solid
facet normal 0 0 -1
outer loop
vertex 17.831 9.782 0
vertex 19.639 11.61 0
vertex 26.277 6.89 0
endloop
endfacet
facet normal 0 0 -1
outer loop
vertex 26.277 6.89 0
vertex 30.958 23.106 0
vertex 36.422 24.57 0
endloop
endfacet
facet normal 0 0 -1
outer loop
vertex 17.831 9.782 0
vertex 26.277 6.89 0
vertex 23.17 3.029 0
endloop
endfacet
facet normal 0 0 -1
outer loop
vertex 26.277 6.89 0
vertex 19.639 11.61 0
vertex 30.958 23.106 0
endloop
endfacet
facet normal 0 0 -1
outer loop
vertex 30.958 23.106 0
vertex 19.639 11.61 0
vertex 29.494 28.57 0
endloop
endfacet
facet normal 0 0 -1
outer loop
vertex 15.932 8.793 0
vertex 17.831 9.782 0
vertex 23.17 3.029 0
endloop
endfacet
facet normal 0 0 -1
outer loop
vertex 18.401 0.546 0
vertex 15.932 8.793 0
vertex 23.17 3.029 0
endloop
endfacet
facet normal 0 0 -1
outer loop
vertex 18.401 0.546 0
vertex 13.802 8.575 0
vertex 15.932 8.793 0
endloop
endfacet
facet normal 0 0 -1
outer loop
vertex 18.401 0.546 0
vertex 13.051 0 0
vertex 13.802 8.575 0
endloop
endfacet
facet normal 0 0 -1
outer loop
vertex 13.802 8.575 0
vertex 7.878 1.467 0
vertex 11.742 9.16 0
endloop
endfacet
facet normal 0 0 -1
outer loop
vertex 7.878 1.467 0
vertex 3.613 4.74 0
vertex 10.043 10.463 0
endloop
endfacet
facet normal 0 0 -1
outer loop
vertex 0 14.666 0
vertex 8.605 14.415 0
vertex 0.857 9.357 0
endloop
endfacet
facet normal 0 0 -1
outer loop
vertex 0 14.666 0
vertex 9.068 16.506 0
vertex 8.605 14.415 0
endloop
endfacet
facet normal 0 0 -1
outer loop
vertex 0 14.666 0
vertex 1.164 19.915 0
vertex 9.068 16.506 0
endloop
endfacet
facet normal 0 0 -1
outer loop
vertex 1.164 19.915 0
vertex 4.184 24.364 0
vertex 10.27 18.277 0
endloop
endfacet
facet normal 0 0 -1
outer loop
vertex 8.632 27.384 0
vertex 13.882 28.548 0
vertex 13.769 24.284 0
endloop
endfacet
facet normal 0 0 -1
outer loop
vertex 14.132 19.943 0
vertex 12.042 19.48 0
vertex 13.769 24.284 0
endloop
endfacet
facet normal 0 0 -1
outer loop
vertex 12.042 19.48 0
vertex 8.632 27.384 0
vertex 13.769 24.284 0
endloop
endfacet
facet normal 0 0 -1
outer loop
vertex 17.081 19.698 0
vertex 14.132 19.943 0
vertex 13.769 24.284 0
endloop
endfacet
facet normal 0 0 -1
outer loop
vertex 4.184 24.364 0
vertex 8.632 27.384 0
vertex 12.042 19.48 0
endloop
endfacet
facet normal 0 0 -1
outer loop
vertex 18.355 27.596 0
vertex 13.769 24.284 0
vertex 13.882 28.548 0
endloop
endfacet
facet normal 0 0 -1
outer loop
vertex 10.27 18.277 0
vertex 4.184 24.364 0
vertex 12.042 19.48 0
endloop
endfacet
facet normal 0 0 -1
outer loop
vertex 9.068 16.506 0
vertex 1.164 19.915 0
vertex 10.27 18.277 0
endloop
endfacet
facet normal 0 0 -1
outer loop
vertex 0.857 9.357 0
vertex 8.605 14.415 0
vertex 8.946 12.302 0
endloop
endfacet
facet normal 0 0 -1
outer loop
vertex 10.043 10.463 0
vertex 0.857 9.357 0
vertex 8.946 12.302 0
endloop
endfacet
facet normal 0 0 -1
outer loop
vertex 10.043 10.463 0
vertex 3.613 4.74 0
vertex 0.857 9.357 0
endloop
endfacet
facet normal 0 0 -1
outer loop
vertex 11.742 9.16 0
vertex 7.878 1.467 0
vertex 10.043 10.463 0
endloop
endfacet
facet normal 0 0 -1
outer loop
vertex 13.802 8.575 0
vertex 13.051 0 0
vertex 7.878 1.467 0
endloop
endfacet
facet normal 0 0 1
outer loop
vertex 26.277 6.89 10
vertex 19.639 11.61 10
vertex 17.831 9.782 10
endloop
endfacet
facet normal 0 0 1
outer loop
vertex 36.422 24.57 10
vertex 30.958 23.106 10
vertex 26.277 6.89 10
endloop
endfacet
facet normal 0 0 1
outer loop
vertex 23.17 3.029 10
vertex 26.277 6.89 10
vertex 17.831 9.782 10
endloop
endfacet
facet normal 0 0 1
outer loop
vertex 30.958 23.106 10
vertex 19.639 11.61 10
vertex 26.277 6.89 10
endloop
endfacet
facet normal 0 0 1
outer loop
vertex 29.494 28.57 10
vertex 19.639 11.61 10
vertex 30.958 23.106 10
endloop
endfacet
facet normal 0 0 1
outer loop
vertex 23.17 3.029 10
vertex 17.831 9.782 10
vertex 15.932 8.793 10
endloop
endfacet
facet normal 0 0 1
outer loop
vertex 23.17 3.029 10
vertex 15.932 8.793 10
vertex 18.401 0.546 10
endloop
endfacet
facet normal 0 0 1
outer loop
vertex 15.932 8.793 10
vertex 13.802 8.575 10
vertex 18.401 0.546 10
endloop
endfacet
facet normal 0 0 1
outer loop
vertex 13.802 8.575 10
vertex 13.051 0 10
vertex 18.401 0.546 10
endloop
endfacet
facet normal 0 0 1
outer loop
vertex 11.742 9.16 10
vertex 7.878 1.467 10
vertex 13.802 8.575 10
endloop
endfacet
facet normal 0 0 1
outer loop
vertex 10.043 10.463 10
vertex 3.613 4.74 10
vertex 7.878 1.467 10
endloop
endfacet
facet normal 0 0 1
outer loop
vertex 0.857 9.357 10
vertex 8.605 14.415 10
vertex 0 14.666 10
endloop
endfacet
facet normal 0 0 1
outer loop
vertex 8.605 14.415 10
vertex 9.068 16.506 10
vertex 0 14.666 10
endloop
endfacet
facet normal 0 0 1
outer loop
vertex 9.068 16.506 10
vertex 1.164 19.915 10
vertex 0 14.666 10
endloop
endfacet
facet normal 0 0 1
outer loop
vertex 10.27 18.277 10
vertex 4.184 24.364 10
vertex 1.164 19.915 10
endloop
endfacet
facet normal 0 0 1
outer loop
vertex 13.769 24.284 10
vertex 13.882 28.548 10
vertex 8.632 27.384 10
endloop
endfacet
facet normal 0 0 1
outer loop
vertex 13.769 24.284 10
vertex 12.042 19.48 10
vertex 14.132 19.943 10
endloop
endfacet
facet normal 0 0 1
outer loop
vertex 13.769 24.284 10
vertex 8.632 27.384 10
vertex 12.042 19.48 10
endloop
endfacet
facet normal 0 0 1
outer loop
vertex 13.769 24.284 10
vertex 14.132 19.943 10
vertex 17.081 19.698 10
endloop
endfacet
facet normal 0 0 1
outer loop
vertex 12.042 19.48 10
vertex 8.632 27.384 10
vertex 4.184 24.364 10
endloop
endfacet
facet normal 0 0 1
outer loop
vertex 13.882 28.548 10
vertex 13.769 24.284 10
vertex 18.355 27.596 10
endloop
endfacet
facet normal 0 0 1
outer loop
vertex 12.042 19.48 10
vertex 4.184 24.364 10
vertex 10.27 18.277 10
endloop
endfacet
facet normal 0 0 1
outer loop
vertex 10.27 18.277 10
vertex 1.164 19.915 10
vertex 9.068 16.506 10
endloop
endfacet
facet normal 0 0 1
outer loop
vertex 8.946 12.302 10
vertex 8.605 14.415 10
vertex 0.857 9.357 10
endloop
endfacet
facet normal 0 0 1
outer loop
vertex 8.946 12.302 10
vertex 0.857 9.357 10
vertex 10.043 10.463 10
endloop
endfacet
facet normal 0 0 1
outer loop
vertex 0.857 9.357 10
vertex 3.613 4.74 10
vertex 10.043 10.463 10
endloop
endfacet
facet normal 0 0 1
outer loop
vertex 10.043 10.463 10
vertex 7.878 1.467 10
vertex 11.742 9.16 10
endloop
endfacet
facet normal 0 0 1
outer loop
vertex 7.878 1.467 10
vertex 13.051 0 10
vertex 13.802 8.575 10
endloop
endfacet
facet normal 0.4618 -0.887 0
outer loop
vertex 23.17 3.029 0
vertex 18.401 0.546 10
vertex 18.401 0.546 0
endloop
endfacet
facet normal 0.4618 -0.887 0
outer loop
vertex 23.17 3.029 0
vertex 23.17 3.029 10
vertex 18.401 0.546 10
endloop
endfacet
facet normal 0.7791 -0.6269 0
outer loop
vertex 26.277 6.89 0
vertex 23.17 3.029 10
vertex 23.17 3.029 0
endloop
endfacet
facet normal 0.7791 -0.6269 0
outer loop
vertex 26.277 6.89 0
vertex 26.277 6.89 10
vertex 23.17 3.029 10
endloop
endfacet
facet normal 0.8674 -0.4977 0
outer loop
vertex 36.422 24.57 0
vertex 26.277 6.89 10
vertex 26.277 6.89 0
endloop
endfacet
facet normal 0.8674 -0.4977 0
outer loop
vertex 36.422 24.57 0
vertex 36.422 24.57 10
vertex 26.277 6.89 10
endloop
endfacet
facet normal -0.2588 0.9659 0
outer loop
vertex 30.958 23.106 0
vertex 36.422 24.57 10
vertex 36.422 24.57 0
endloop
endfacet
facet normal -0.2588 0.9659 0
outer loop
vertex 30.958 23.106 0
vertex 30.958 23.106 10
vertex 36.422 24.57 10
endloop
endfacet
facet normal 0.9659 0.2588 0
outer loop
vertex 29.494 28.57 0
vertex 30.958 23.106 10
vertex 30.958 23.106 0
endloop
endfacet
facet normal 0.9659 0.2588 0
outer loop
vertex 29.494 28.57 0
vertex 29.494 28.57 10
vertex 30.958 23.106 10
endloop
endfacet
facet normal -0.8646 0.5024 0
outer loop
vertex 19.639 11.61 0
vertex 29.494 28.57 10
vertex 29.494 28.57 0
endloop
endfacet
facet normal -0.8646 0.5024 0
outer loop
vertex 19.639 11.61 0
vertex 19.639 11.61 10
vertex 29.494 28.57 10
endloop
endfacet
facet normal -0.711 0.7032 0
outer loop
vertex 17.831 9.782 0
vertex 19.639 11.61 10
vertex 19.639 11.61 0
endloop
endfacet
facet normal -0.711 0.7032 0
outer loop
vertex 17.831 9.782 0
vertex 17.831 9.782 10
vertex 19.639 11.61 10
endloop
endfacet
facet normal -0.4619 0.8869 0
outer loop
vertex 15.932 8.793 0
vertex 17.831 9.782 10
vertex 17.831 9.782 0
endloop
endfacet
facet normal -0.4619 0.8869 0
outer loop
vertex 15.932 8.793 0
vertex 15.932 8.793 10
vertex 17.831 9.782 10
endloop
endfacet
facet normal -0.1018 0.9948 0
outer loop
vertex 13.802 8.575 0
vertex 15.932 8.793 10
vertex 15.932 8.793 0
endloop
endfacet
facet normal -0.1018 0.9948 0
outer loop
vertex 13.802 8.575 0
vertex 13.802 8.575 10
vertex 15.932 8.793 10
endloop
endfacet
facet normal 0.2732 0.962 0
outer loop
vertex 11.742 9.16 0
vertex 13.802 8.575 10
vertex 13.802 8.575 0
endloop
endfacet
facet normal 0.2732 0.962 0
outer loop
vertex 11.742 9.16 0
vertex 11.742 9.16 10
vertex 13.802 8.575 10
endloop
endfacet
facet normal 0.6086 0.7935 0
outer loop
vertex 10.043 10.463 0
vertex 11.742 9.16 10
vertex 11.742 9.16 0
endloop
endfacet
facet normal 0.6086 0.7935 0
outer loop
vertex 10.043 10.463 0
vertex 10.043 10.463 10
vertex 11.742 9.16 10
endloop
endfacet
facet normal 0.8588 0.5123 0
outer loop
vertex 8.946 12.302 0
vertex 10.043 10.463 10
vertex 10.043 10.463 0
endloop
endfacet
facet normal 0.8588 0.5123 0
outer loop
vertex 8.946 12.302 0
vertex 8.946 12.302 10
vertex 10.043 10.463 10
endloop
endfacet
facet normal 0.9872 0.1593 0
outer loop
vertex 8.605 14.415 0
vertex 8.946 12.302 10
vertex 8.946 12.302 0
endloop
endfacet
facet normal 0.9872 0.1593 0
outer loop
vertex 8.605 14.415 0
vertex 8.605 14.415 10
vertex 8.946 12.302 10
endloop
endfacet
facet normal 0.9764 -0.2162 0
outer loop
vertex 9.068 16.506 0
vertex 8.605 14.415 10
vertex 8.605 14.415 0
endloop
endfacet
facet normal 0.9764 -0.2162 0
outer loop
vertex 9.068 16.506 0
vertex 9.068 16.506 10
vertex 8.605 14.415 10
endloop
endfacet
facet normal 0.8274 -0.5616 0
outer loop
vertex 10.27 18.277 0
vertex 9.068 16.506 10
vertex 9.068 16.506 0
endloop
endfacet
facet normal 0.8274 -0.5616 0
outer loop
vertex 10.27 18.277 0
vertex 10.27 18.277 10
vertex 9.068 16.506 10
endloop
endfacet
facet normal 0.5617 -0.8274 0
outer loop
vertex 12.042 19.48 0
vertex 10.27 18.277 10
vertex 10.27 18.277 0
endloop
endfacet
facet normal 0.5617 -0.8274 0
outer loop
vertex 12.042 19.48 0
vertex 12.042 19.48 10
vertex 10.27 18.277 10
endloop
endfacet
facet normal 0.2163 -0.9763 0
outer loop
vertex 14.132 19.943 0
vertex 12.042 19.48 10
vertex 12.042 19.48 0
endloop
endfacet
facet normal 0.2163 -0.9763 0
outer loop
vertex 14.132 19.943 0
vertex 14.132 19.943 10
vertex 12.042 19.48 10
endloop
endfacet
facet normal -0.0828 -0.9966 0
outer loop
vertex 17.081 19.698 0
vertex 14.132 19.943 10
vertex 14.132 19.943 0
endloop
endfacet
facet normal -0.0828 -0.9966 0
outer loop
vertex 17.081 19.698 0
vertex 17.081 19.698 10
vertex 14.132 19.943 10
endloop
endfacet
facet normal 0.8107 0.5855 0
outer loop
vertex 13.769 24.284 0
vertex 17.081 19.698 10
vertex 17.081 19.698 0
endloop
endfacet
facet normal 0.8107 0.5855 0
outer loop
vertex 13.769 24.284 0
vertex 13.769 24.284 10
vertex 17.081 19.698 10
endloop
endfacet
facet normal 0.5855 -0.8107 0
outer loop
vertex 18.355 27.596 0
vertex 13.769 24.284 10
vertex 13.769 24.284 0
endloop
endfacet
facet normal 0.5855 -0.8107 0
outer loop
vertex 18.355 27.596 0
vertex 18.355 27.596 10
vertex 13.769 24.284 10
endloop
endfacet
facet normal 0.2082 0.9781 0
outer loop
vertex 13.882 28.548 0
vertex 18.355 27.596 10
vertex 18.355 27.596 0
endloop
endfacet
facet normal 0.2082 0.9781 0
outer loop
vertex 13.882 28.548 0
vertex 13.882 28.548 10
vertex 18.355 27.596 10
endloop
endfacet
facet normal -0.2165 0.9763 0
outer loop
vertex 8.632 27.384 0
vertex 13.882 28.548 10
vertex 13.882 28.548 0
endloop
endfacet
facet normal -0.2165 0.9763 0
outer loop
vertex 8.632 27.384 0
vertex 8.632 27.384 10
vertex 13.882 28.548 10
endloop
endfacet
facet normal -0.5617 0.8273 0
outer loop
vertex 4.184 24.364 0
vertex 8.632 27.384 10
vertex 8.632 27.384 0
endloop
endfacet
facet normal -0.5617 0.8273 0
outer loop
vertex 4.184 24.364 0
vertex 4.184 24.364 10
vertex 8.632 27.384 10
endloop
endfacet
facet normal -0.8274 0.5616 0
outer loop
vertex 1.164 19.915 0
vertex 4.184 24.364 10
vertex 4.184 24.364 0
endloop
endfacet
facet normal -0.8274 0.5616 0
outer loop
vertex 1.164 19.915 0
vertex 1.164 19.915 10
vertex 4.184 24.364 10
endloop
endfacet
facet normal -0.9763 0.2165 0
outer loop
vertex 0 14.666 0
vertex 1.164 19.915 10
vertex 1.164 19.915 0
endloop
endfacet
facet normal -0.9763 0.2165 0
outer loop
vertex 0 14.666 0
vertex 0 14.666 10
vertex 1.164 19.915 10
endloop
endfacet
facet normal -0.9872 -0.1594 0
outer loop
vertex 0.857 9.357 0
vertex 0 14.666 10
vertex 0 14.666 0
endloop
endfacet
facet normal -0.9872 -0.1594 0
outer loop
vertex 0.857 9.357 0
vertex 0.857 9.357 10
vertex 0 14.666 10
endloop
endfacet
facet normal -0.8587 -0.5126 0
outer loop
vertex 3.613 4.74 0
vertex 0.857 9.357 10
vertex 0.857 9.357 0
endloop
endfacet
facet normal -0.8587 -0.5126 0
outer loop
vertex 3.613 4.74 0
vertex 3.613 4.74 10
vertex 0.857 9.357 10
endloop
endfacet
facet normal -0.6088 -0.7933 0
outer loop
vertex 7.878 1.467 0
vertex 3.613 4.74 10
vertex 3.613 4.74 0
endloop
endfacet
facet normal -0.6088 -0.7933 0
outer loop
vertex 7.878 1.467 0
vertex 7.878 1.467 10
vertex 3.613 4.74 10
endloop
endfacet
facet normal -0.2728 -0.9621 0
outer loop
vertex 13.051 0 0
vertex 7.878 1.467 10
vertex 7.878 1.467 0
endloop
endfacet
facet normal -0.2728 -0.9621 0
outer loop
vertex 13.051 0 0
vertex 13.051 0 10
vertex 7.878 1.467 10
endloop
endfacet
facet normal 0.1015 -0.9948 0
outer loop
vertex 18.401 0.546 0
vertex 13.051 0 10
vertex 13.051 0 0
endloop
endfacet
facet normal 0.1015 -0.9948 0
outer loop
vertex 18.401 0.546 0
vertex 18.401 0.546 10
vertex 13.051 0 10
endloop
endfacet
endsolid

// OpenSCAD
$fn = 32;

// ----------------------------------------------------------------------
// Eye lug: ring_tail, 10 mm thick
// ----------------------------------------------------------------------

// --- parameters (mm) ---
profile_height = 10;      // extrusion height
profile_points = 30;      // points of the closed outline

profile = [[13.769, 24.284], [18.355, 27.596], [13.882, 28.548], [8.632, 27.384], [4.184, 24.364], [1.164, 19.915], [0, 14.666], [0.857, 9.357], [3.613, 4.74], [7.878, 1.467], [13.051, 0], [18.401, 0.546], [23.17, 3.029], [26.277, 6.89], [36.422, 24.57], [30.958, 23.106], [29.494, 28.57], [19.639, 11.61], [17.831, 9.782], [15.932, 8.793], [13.802, 8.575], [11.742, 9.16], [10.043, 10.463], [8.946, 12.302], [8.605, 14.415], [9.068, 16.506], [10.27, 18.277], [12.042, 19.48], [14.132, 19.943], [17.081, 19.698]];  // single closed polygon, 30 points, counter clockwise

// --- the one profile operation ---
linear_extrude(height = profile_height) polygon(points = profile);
